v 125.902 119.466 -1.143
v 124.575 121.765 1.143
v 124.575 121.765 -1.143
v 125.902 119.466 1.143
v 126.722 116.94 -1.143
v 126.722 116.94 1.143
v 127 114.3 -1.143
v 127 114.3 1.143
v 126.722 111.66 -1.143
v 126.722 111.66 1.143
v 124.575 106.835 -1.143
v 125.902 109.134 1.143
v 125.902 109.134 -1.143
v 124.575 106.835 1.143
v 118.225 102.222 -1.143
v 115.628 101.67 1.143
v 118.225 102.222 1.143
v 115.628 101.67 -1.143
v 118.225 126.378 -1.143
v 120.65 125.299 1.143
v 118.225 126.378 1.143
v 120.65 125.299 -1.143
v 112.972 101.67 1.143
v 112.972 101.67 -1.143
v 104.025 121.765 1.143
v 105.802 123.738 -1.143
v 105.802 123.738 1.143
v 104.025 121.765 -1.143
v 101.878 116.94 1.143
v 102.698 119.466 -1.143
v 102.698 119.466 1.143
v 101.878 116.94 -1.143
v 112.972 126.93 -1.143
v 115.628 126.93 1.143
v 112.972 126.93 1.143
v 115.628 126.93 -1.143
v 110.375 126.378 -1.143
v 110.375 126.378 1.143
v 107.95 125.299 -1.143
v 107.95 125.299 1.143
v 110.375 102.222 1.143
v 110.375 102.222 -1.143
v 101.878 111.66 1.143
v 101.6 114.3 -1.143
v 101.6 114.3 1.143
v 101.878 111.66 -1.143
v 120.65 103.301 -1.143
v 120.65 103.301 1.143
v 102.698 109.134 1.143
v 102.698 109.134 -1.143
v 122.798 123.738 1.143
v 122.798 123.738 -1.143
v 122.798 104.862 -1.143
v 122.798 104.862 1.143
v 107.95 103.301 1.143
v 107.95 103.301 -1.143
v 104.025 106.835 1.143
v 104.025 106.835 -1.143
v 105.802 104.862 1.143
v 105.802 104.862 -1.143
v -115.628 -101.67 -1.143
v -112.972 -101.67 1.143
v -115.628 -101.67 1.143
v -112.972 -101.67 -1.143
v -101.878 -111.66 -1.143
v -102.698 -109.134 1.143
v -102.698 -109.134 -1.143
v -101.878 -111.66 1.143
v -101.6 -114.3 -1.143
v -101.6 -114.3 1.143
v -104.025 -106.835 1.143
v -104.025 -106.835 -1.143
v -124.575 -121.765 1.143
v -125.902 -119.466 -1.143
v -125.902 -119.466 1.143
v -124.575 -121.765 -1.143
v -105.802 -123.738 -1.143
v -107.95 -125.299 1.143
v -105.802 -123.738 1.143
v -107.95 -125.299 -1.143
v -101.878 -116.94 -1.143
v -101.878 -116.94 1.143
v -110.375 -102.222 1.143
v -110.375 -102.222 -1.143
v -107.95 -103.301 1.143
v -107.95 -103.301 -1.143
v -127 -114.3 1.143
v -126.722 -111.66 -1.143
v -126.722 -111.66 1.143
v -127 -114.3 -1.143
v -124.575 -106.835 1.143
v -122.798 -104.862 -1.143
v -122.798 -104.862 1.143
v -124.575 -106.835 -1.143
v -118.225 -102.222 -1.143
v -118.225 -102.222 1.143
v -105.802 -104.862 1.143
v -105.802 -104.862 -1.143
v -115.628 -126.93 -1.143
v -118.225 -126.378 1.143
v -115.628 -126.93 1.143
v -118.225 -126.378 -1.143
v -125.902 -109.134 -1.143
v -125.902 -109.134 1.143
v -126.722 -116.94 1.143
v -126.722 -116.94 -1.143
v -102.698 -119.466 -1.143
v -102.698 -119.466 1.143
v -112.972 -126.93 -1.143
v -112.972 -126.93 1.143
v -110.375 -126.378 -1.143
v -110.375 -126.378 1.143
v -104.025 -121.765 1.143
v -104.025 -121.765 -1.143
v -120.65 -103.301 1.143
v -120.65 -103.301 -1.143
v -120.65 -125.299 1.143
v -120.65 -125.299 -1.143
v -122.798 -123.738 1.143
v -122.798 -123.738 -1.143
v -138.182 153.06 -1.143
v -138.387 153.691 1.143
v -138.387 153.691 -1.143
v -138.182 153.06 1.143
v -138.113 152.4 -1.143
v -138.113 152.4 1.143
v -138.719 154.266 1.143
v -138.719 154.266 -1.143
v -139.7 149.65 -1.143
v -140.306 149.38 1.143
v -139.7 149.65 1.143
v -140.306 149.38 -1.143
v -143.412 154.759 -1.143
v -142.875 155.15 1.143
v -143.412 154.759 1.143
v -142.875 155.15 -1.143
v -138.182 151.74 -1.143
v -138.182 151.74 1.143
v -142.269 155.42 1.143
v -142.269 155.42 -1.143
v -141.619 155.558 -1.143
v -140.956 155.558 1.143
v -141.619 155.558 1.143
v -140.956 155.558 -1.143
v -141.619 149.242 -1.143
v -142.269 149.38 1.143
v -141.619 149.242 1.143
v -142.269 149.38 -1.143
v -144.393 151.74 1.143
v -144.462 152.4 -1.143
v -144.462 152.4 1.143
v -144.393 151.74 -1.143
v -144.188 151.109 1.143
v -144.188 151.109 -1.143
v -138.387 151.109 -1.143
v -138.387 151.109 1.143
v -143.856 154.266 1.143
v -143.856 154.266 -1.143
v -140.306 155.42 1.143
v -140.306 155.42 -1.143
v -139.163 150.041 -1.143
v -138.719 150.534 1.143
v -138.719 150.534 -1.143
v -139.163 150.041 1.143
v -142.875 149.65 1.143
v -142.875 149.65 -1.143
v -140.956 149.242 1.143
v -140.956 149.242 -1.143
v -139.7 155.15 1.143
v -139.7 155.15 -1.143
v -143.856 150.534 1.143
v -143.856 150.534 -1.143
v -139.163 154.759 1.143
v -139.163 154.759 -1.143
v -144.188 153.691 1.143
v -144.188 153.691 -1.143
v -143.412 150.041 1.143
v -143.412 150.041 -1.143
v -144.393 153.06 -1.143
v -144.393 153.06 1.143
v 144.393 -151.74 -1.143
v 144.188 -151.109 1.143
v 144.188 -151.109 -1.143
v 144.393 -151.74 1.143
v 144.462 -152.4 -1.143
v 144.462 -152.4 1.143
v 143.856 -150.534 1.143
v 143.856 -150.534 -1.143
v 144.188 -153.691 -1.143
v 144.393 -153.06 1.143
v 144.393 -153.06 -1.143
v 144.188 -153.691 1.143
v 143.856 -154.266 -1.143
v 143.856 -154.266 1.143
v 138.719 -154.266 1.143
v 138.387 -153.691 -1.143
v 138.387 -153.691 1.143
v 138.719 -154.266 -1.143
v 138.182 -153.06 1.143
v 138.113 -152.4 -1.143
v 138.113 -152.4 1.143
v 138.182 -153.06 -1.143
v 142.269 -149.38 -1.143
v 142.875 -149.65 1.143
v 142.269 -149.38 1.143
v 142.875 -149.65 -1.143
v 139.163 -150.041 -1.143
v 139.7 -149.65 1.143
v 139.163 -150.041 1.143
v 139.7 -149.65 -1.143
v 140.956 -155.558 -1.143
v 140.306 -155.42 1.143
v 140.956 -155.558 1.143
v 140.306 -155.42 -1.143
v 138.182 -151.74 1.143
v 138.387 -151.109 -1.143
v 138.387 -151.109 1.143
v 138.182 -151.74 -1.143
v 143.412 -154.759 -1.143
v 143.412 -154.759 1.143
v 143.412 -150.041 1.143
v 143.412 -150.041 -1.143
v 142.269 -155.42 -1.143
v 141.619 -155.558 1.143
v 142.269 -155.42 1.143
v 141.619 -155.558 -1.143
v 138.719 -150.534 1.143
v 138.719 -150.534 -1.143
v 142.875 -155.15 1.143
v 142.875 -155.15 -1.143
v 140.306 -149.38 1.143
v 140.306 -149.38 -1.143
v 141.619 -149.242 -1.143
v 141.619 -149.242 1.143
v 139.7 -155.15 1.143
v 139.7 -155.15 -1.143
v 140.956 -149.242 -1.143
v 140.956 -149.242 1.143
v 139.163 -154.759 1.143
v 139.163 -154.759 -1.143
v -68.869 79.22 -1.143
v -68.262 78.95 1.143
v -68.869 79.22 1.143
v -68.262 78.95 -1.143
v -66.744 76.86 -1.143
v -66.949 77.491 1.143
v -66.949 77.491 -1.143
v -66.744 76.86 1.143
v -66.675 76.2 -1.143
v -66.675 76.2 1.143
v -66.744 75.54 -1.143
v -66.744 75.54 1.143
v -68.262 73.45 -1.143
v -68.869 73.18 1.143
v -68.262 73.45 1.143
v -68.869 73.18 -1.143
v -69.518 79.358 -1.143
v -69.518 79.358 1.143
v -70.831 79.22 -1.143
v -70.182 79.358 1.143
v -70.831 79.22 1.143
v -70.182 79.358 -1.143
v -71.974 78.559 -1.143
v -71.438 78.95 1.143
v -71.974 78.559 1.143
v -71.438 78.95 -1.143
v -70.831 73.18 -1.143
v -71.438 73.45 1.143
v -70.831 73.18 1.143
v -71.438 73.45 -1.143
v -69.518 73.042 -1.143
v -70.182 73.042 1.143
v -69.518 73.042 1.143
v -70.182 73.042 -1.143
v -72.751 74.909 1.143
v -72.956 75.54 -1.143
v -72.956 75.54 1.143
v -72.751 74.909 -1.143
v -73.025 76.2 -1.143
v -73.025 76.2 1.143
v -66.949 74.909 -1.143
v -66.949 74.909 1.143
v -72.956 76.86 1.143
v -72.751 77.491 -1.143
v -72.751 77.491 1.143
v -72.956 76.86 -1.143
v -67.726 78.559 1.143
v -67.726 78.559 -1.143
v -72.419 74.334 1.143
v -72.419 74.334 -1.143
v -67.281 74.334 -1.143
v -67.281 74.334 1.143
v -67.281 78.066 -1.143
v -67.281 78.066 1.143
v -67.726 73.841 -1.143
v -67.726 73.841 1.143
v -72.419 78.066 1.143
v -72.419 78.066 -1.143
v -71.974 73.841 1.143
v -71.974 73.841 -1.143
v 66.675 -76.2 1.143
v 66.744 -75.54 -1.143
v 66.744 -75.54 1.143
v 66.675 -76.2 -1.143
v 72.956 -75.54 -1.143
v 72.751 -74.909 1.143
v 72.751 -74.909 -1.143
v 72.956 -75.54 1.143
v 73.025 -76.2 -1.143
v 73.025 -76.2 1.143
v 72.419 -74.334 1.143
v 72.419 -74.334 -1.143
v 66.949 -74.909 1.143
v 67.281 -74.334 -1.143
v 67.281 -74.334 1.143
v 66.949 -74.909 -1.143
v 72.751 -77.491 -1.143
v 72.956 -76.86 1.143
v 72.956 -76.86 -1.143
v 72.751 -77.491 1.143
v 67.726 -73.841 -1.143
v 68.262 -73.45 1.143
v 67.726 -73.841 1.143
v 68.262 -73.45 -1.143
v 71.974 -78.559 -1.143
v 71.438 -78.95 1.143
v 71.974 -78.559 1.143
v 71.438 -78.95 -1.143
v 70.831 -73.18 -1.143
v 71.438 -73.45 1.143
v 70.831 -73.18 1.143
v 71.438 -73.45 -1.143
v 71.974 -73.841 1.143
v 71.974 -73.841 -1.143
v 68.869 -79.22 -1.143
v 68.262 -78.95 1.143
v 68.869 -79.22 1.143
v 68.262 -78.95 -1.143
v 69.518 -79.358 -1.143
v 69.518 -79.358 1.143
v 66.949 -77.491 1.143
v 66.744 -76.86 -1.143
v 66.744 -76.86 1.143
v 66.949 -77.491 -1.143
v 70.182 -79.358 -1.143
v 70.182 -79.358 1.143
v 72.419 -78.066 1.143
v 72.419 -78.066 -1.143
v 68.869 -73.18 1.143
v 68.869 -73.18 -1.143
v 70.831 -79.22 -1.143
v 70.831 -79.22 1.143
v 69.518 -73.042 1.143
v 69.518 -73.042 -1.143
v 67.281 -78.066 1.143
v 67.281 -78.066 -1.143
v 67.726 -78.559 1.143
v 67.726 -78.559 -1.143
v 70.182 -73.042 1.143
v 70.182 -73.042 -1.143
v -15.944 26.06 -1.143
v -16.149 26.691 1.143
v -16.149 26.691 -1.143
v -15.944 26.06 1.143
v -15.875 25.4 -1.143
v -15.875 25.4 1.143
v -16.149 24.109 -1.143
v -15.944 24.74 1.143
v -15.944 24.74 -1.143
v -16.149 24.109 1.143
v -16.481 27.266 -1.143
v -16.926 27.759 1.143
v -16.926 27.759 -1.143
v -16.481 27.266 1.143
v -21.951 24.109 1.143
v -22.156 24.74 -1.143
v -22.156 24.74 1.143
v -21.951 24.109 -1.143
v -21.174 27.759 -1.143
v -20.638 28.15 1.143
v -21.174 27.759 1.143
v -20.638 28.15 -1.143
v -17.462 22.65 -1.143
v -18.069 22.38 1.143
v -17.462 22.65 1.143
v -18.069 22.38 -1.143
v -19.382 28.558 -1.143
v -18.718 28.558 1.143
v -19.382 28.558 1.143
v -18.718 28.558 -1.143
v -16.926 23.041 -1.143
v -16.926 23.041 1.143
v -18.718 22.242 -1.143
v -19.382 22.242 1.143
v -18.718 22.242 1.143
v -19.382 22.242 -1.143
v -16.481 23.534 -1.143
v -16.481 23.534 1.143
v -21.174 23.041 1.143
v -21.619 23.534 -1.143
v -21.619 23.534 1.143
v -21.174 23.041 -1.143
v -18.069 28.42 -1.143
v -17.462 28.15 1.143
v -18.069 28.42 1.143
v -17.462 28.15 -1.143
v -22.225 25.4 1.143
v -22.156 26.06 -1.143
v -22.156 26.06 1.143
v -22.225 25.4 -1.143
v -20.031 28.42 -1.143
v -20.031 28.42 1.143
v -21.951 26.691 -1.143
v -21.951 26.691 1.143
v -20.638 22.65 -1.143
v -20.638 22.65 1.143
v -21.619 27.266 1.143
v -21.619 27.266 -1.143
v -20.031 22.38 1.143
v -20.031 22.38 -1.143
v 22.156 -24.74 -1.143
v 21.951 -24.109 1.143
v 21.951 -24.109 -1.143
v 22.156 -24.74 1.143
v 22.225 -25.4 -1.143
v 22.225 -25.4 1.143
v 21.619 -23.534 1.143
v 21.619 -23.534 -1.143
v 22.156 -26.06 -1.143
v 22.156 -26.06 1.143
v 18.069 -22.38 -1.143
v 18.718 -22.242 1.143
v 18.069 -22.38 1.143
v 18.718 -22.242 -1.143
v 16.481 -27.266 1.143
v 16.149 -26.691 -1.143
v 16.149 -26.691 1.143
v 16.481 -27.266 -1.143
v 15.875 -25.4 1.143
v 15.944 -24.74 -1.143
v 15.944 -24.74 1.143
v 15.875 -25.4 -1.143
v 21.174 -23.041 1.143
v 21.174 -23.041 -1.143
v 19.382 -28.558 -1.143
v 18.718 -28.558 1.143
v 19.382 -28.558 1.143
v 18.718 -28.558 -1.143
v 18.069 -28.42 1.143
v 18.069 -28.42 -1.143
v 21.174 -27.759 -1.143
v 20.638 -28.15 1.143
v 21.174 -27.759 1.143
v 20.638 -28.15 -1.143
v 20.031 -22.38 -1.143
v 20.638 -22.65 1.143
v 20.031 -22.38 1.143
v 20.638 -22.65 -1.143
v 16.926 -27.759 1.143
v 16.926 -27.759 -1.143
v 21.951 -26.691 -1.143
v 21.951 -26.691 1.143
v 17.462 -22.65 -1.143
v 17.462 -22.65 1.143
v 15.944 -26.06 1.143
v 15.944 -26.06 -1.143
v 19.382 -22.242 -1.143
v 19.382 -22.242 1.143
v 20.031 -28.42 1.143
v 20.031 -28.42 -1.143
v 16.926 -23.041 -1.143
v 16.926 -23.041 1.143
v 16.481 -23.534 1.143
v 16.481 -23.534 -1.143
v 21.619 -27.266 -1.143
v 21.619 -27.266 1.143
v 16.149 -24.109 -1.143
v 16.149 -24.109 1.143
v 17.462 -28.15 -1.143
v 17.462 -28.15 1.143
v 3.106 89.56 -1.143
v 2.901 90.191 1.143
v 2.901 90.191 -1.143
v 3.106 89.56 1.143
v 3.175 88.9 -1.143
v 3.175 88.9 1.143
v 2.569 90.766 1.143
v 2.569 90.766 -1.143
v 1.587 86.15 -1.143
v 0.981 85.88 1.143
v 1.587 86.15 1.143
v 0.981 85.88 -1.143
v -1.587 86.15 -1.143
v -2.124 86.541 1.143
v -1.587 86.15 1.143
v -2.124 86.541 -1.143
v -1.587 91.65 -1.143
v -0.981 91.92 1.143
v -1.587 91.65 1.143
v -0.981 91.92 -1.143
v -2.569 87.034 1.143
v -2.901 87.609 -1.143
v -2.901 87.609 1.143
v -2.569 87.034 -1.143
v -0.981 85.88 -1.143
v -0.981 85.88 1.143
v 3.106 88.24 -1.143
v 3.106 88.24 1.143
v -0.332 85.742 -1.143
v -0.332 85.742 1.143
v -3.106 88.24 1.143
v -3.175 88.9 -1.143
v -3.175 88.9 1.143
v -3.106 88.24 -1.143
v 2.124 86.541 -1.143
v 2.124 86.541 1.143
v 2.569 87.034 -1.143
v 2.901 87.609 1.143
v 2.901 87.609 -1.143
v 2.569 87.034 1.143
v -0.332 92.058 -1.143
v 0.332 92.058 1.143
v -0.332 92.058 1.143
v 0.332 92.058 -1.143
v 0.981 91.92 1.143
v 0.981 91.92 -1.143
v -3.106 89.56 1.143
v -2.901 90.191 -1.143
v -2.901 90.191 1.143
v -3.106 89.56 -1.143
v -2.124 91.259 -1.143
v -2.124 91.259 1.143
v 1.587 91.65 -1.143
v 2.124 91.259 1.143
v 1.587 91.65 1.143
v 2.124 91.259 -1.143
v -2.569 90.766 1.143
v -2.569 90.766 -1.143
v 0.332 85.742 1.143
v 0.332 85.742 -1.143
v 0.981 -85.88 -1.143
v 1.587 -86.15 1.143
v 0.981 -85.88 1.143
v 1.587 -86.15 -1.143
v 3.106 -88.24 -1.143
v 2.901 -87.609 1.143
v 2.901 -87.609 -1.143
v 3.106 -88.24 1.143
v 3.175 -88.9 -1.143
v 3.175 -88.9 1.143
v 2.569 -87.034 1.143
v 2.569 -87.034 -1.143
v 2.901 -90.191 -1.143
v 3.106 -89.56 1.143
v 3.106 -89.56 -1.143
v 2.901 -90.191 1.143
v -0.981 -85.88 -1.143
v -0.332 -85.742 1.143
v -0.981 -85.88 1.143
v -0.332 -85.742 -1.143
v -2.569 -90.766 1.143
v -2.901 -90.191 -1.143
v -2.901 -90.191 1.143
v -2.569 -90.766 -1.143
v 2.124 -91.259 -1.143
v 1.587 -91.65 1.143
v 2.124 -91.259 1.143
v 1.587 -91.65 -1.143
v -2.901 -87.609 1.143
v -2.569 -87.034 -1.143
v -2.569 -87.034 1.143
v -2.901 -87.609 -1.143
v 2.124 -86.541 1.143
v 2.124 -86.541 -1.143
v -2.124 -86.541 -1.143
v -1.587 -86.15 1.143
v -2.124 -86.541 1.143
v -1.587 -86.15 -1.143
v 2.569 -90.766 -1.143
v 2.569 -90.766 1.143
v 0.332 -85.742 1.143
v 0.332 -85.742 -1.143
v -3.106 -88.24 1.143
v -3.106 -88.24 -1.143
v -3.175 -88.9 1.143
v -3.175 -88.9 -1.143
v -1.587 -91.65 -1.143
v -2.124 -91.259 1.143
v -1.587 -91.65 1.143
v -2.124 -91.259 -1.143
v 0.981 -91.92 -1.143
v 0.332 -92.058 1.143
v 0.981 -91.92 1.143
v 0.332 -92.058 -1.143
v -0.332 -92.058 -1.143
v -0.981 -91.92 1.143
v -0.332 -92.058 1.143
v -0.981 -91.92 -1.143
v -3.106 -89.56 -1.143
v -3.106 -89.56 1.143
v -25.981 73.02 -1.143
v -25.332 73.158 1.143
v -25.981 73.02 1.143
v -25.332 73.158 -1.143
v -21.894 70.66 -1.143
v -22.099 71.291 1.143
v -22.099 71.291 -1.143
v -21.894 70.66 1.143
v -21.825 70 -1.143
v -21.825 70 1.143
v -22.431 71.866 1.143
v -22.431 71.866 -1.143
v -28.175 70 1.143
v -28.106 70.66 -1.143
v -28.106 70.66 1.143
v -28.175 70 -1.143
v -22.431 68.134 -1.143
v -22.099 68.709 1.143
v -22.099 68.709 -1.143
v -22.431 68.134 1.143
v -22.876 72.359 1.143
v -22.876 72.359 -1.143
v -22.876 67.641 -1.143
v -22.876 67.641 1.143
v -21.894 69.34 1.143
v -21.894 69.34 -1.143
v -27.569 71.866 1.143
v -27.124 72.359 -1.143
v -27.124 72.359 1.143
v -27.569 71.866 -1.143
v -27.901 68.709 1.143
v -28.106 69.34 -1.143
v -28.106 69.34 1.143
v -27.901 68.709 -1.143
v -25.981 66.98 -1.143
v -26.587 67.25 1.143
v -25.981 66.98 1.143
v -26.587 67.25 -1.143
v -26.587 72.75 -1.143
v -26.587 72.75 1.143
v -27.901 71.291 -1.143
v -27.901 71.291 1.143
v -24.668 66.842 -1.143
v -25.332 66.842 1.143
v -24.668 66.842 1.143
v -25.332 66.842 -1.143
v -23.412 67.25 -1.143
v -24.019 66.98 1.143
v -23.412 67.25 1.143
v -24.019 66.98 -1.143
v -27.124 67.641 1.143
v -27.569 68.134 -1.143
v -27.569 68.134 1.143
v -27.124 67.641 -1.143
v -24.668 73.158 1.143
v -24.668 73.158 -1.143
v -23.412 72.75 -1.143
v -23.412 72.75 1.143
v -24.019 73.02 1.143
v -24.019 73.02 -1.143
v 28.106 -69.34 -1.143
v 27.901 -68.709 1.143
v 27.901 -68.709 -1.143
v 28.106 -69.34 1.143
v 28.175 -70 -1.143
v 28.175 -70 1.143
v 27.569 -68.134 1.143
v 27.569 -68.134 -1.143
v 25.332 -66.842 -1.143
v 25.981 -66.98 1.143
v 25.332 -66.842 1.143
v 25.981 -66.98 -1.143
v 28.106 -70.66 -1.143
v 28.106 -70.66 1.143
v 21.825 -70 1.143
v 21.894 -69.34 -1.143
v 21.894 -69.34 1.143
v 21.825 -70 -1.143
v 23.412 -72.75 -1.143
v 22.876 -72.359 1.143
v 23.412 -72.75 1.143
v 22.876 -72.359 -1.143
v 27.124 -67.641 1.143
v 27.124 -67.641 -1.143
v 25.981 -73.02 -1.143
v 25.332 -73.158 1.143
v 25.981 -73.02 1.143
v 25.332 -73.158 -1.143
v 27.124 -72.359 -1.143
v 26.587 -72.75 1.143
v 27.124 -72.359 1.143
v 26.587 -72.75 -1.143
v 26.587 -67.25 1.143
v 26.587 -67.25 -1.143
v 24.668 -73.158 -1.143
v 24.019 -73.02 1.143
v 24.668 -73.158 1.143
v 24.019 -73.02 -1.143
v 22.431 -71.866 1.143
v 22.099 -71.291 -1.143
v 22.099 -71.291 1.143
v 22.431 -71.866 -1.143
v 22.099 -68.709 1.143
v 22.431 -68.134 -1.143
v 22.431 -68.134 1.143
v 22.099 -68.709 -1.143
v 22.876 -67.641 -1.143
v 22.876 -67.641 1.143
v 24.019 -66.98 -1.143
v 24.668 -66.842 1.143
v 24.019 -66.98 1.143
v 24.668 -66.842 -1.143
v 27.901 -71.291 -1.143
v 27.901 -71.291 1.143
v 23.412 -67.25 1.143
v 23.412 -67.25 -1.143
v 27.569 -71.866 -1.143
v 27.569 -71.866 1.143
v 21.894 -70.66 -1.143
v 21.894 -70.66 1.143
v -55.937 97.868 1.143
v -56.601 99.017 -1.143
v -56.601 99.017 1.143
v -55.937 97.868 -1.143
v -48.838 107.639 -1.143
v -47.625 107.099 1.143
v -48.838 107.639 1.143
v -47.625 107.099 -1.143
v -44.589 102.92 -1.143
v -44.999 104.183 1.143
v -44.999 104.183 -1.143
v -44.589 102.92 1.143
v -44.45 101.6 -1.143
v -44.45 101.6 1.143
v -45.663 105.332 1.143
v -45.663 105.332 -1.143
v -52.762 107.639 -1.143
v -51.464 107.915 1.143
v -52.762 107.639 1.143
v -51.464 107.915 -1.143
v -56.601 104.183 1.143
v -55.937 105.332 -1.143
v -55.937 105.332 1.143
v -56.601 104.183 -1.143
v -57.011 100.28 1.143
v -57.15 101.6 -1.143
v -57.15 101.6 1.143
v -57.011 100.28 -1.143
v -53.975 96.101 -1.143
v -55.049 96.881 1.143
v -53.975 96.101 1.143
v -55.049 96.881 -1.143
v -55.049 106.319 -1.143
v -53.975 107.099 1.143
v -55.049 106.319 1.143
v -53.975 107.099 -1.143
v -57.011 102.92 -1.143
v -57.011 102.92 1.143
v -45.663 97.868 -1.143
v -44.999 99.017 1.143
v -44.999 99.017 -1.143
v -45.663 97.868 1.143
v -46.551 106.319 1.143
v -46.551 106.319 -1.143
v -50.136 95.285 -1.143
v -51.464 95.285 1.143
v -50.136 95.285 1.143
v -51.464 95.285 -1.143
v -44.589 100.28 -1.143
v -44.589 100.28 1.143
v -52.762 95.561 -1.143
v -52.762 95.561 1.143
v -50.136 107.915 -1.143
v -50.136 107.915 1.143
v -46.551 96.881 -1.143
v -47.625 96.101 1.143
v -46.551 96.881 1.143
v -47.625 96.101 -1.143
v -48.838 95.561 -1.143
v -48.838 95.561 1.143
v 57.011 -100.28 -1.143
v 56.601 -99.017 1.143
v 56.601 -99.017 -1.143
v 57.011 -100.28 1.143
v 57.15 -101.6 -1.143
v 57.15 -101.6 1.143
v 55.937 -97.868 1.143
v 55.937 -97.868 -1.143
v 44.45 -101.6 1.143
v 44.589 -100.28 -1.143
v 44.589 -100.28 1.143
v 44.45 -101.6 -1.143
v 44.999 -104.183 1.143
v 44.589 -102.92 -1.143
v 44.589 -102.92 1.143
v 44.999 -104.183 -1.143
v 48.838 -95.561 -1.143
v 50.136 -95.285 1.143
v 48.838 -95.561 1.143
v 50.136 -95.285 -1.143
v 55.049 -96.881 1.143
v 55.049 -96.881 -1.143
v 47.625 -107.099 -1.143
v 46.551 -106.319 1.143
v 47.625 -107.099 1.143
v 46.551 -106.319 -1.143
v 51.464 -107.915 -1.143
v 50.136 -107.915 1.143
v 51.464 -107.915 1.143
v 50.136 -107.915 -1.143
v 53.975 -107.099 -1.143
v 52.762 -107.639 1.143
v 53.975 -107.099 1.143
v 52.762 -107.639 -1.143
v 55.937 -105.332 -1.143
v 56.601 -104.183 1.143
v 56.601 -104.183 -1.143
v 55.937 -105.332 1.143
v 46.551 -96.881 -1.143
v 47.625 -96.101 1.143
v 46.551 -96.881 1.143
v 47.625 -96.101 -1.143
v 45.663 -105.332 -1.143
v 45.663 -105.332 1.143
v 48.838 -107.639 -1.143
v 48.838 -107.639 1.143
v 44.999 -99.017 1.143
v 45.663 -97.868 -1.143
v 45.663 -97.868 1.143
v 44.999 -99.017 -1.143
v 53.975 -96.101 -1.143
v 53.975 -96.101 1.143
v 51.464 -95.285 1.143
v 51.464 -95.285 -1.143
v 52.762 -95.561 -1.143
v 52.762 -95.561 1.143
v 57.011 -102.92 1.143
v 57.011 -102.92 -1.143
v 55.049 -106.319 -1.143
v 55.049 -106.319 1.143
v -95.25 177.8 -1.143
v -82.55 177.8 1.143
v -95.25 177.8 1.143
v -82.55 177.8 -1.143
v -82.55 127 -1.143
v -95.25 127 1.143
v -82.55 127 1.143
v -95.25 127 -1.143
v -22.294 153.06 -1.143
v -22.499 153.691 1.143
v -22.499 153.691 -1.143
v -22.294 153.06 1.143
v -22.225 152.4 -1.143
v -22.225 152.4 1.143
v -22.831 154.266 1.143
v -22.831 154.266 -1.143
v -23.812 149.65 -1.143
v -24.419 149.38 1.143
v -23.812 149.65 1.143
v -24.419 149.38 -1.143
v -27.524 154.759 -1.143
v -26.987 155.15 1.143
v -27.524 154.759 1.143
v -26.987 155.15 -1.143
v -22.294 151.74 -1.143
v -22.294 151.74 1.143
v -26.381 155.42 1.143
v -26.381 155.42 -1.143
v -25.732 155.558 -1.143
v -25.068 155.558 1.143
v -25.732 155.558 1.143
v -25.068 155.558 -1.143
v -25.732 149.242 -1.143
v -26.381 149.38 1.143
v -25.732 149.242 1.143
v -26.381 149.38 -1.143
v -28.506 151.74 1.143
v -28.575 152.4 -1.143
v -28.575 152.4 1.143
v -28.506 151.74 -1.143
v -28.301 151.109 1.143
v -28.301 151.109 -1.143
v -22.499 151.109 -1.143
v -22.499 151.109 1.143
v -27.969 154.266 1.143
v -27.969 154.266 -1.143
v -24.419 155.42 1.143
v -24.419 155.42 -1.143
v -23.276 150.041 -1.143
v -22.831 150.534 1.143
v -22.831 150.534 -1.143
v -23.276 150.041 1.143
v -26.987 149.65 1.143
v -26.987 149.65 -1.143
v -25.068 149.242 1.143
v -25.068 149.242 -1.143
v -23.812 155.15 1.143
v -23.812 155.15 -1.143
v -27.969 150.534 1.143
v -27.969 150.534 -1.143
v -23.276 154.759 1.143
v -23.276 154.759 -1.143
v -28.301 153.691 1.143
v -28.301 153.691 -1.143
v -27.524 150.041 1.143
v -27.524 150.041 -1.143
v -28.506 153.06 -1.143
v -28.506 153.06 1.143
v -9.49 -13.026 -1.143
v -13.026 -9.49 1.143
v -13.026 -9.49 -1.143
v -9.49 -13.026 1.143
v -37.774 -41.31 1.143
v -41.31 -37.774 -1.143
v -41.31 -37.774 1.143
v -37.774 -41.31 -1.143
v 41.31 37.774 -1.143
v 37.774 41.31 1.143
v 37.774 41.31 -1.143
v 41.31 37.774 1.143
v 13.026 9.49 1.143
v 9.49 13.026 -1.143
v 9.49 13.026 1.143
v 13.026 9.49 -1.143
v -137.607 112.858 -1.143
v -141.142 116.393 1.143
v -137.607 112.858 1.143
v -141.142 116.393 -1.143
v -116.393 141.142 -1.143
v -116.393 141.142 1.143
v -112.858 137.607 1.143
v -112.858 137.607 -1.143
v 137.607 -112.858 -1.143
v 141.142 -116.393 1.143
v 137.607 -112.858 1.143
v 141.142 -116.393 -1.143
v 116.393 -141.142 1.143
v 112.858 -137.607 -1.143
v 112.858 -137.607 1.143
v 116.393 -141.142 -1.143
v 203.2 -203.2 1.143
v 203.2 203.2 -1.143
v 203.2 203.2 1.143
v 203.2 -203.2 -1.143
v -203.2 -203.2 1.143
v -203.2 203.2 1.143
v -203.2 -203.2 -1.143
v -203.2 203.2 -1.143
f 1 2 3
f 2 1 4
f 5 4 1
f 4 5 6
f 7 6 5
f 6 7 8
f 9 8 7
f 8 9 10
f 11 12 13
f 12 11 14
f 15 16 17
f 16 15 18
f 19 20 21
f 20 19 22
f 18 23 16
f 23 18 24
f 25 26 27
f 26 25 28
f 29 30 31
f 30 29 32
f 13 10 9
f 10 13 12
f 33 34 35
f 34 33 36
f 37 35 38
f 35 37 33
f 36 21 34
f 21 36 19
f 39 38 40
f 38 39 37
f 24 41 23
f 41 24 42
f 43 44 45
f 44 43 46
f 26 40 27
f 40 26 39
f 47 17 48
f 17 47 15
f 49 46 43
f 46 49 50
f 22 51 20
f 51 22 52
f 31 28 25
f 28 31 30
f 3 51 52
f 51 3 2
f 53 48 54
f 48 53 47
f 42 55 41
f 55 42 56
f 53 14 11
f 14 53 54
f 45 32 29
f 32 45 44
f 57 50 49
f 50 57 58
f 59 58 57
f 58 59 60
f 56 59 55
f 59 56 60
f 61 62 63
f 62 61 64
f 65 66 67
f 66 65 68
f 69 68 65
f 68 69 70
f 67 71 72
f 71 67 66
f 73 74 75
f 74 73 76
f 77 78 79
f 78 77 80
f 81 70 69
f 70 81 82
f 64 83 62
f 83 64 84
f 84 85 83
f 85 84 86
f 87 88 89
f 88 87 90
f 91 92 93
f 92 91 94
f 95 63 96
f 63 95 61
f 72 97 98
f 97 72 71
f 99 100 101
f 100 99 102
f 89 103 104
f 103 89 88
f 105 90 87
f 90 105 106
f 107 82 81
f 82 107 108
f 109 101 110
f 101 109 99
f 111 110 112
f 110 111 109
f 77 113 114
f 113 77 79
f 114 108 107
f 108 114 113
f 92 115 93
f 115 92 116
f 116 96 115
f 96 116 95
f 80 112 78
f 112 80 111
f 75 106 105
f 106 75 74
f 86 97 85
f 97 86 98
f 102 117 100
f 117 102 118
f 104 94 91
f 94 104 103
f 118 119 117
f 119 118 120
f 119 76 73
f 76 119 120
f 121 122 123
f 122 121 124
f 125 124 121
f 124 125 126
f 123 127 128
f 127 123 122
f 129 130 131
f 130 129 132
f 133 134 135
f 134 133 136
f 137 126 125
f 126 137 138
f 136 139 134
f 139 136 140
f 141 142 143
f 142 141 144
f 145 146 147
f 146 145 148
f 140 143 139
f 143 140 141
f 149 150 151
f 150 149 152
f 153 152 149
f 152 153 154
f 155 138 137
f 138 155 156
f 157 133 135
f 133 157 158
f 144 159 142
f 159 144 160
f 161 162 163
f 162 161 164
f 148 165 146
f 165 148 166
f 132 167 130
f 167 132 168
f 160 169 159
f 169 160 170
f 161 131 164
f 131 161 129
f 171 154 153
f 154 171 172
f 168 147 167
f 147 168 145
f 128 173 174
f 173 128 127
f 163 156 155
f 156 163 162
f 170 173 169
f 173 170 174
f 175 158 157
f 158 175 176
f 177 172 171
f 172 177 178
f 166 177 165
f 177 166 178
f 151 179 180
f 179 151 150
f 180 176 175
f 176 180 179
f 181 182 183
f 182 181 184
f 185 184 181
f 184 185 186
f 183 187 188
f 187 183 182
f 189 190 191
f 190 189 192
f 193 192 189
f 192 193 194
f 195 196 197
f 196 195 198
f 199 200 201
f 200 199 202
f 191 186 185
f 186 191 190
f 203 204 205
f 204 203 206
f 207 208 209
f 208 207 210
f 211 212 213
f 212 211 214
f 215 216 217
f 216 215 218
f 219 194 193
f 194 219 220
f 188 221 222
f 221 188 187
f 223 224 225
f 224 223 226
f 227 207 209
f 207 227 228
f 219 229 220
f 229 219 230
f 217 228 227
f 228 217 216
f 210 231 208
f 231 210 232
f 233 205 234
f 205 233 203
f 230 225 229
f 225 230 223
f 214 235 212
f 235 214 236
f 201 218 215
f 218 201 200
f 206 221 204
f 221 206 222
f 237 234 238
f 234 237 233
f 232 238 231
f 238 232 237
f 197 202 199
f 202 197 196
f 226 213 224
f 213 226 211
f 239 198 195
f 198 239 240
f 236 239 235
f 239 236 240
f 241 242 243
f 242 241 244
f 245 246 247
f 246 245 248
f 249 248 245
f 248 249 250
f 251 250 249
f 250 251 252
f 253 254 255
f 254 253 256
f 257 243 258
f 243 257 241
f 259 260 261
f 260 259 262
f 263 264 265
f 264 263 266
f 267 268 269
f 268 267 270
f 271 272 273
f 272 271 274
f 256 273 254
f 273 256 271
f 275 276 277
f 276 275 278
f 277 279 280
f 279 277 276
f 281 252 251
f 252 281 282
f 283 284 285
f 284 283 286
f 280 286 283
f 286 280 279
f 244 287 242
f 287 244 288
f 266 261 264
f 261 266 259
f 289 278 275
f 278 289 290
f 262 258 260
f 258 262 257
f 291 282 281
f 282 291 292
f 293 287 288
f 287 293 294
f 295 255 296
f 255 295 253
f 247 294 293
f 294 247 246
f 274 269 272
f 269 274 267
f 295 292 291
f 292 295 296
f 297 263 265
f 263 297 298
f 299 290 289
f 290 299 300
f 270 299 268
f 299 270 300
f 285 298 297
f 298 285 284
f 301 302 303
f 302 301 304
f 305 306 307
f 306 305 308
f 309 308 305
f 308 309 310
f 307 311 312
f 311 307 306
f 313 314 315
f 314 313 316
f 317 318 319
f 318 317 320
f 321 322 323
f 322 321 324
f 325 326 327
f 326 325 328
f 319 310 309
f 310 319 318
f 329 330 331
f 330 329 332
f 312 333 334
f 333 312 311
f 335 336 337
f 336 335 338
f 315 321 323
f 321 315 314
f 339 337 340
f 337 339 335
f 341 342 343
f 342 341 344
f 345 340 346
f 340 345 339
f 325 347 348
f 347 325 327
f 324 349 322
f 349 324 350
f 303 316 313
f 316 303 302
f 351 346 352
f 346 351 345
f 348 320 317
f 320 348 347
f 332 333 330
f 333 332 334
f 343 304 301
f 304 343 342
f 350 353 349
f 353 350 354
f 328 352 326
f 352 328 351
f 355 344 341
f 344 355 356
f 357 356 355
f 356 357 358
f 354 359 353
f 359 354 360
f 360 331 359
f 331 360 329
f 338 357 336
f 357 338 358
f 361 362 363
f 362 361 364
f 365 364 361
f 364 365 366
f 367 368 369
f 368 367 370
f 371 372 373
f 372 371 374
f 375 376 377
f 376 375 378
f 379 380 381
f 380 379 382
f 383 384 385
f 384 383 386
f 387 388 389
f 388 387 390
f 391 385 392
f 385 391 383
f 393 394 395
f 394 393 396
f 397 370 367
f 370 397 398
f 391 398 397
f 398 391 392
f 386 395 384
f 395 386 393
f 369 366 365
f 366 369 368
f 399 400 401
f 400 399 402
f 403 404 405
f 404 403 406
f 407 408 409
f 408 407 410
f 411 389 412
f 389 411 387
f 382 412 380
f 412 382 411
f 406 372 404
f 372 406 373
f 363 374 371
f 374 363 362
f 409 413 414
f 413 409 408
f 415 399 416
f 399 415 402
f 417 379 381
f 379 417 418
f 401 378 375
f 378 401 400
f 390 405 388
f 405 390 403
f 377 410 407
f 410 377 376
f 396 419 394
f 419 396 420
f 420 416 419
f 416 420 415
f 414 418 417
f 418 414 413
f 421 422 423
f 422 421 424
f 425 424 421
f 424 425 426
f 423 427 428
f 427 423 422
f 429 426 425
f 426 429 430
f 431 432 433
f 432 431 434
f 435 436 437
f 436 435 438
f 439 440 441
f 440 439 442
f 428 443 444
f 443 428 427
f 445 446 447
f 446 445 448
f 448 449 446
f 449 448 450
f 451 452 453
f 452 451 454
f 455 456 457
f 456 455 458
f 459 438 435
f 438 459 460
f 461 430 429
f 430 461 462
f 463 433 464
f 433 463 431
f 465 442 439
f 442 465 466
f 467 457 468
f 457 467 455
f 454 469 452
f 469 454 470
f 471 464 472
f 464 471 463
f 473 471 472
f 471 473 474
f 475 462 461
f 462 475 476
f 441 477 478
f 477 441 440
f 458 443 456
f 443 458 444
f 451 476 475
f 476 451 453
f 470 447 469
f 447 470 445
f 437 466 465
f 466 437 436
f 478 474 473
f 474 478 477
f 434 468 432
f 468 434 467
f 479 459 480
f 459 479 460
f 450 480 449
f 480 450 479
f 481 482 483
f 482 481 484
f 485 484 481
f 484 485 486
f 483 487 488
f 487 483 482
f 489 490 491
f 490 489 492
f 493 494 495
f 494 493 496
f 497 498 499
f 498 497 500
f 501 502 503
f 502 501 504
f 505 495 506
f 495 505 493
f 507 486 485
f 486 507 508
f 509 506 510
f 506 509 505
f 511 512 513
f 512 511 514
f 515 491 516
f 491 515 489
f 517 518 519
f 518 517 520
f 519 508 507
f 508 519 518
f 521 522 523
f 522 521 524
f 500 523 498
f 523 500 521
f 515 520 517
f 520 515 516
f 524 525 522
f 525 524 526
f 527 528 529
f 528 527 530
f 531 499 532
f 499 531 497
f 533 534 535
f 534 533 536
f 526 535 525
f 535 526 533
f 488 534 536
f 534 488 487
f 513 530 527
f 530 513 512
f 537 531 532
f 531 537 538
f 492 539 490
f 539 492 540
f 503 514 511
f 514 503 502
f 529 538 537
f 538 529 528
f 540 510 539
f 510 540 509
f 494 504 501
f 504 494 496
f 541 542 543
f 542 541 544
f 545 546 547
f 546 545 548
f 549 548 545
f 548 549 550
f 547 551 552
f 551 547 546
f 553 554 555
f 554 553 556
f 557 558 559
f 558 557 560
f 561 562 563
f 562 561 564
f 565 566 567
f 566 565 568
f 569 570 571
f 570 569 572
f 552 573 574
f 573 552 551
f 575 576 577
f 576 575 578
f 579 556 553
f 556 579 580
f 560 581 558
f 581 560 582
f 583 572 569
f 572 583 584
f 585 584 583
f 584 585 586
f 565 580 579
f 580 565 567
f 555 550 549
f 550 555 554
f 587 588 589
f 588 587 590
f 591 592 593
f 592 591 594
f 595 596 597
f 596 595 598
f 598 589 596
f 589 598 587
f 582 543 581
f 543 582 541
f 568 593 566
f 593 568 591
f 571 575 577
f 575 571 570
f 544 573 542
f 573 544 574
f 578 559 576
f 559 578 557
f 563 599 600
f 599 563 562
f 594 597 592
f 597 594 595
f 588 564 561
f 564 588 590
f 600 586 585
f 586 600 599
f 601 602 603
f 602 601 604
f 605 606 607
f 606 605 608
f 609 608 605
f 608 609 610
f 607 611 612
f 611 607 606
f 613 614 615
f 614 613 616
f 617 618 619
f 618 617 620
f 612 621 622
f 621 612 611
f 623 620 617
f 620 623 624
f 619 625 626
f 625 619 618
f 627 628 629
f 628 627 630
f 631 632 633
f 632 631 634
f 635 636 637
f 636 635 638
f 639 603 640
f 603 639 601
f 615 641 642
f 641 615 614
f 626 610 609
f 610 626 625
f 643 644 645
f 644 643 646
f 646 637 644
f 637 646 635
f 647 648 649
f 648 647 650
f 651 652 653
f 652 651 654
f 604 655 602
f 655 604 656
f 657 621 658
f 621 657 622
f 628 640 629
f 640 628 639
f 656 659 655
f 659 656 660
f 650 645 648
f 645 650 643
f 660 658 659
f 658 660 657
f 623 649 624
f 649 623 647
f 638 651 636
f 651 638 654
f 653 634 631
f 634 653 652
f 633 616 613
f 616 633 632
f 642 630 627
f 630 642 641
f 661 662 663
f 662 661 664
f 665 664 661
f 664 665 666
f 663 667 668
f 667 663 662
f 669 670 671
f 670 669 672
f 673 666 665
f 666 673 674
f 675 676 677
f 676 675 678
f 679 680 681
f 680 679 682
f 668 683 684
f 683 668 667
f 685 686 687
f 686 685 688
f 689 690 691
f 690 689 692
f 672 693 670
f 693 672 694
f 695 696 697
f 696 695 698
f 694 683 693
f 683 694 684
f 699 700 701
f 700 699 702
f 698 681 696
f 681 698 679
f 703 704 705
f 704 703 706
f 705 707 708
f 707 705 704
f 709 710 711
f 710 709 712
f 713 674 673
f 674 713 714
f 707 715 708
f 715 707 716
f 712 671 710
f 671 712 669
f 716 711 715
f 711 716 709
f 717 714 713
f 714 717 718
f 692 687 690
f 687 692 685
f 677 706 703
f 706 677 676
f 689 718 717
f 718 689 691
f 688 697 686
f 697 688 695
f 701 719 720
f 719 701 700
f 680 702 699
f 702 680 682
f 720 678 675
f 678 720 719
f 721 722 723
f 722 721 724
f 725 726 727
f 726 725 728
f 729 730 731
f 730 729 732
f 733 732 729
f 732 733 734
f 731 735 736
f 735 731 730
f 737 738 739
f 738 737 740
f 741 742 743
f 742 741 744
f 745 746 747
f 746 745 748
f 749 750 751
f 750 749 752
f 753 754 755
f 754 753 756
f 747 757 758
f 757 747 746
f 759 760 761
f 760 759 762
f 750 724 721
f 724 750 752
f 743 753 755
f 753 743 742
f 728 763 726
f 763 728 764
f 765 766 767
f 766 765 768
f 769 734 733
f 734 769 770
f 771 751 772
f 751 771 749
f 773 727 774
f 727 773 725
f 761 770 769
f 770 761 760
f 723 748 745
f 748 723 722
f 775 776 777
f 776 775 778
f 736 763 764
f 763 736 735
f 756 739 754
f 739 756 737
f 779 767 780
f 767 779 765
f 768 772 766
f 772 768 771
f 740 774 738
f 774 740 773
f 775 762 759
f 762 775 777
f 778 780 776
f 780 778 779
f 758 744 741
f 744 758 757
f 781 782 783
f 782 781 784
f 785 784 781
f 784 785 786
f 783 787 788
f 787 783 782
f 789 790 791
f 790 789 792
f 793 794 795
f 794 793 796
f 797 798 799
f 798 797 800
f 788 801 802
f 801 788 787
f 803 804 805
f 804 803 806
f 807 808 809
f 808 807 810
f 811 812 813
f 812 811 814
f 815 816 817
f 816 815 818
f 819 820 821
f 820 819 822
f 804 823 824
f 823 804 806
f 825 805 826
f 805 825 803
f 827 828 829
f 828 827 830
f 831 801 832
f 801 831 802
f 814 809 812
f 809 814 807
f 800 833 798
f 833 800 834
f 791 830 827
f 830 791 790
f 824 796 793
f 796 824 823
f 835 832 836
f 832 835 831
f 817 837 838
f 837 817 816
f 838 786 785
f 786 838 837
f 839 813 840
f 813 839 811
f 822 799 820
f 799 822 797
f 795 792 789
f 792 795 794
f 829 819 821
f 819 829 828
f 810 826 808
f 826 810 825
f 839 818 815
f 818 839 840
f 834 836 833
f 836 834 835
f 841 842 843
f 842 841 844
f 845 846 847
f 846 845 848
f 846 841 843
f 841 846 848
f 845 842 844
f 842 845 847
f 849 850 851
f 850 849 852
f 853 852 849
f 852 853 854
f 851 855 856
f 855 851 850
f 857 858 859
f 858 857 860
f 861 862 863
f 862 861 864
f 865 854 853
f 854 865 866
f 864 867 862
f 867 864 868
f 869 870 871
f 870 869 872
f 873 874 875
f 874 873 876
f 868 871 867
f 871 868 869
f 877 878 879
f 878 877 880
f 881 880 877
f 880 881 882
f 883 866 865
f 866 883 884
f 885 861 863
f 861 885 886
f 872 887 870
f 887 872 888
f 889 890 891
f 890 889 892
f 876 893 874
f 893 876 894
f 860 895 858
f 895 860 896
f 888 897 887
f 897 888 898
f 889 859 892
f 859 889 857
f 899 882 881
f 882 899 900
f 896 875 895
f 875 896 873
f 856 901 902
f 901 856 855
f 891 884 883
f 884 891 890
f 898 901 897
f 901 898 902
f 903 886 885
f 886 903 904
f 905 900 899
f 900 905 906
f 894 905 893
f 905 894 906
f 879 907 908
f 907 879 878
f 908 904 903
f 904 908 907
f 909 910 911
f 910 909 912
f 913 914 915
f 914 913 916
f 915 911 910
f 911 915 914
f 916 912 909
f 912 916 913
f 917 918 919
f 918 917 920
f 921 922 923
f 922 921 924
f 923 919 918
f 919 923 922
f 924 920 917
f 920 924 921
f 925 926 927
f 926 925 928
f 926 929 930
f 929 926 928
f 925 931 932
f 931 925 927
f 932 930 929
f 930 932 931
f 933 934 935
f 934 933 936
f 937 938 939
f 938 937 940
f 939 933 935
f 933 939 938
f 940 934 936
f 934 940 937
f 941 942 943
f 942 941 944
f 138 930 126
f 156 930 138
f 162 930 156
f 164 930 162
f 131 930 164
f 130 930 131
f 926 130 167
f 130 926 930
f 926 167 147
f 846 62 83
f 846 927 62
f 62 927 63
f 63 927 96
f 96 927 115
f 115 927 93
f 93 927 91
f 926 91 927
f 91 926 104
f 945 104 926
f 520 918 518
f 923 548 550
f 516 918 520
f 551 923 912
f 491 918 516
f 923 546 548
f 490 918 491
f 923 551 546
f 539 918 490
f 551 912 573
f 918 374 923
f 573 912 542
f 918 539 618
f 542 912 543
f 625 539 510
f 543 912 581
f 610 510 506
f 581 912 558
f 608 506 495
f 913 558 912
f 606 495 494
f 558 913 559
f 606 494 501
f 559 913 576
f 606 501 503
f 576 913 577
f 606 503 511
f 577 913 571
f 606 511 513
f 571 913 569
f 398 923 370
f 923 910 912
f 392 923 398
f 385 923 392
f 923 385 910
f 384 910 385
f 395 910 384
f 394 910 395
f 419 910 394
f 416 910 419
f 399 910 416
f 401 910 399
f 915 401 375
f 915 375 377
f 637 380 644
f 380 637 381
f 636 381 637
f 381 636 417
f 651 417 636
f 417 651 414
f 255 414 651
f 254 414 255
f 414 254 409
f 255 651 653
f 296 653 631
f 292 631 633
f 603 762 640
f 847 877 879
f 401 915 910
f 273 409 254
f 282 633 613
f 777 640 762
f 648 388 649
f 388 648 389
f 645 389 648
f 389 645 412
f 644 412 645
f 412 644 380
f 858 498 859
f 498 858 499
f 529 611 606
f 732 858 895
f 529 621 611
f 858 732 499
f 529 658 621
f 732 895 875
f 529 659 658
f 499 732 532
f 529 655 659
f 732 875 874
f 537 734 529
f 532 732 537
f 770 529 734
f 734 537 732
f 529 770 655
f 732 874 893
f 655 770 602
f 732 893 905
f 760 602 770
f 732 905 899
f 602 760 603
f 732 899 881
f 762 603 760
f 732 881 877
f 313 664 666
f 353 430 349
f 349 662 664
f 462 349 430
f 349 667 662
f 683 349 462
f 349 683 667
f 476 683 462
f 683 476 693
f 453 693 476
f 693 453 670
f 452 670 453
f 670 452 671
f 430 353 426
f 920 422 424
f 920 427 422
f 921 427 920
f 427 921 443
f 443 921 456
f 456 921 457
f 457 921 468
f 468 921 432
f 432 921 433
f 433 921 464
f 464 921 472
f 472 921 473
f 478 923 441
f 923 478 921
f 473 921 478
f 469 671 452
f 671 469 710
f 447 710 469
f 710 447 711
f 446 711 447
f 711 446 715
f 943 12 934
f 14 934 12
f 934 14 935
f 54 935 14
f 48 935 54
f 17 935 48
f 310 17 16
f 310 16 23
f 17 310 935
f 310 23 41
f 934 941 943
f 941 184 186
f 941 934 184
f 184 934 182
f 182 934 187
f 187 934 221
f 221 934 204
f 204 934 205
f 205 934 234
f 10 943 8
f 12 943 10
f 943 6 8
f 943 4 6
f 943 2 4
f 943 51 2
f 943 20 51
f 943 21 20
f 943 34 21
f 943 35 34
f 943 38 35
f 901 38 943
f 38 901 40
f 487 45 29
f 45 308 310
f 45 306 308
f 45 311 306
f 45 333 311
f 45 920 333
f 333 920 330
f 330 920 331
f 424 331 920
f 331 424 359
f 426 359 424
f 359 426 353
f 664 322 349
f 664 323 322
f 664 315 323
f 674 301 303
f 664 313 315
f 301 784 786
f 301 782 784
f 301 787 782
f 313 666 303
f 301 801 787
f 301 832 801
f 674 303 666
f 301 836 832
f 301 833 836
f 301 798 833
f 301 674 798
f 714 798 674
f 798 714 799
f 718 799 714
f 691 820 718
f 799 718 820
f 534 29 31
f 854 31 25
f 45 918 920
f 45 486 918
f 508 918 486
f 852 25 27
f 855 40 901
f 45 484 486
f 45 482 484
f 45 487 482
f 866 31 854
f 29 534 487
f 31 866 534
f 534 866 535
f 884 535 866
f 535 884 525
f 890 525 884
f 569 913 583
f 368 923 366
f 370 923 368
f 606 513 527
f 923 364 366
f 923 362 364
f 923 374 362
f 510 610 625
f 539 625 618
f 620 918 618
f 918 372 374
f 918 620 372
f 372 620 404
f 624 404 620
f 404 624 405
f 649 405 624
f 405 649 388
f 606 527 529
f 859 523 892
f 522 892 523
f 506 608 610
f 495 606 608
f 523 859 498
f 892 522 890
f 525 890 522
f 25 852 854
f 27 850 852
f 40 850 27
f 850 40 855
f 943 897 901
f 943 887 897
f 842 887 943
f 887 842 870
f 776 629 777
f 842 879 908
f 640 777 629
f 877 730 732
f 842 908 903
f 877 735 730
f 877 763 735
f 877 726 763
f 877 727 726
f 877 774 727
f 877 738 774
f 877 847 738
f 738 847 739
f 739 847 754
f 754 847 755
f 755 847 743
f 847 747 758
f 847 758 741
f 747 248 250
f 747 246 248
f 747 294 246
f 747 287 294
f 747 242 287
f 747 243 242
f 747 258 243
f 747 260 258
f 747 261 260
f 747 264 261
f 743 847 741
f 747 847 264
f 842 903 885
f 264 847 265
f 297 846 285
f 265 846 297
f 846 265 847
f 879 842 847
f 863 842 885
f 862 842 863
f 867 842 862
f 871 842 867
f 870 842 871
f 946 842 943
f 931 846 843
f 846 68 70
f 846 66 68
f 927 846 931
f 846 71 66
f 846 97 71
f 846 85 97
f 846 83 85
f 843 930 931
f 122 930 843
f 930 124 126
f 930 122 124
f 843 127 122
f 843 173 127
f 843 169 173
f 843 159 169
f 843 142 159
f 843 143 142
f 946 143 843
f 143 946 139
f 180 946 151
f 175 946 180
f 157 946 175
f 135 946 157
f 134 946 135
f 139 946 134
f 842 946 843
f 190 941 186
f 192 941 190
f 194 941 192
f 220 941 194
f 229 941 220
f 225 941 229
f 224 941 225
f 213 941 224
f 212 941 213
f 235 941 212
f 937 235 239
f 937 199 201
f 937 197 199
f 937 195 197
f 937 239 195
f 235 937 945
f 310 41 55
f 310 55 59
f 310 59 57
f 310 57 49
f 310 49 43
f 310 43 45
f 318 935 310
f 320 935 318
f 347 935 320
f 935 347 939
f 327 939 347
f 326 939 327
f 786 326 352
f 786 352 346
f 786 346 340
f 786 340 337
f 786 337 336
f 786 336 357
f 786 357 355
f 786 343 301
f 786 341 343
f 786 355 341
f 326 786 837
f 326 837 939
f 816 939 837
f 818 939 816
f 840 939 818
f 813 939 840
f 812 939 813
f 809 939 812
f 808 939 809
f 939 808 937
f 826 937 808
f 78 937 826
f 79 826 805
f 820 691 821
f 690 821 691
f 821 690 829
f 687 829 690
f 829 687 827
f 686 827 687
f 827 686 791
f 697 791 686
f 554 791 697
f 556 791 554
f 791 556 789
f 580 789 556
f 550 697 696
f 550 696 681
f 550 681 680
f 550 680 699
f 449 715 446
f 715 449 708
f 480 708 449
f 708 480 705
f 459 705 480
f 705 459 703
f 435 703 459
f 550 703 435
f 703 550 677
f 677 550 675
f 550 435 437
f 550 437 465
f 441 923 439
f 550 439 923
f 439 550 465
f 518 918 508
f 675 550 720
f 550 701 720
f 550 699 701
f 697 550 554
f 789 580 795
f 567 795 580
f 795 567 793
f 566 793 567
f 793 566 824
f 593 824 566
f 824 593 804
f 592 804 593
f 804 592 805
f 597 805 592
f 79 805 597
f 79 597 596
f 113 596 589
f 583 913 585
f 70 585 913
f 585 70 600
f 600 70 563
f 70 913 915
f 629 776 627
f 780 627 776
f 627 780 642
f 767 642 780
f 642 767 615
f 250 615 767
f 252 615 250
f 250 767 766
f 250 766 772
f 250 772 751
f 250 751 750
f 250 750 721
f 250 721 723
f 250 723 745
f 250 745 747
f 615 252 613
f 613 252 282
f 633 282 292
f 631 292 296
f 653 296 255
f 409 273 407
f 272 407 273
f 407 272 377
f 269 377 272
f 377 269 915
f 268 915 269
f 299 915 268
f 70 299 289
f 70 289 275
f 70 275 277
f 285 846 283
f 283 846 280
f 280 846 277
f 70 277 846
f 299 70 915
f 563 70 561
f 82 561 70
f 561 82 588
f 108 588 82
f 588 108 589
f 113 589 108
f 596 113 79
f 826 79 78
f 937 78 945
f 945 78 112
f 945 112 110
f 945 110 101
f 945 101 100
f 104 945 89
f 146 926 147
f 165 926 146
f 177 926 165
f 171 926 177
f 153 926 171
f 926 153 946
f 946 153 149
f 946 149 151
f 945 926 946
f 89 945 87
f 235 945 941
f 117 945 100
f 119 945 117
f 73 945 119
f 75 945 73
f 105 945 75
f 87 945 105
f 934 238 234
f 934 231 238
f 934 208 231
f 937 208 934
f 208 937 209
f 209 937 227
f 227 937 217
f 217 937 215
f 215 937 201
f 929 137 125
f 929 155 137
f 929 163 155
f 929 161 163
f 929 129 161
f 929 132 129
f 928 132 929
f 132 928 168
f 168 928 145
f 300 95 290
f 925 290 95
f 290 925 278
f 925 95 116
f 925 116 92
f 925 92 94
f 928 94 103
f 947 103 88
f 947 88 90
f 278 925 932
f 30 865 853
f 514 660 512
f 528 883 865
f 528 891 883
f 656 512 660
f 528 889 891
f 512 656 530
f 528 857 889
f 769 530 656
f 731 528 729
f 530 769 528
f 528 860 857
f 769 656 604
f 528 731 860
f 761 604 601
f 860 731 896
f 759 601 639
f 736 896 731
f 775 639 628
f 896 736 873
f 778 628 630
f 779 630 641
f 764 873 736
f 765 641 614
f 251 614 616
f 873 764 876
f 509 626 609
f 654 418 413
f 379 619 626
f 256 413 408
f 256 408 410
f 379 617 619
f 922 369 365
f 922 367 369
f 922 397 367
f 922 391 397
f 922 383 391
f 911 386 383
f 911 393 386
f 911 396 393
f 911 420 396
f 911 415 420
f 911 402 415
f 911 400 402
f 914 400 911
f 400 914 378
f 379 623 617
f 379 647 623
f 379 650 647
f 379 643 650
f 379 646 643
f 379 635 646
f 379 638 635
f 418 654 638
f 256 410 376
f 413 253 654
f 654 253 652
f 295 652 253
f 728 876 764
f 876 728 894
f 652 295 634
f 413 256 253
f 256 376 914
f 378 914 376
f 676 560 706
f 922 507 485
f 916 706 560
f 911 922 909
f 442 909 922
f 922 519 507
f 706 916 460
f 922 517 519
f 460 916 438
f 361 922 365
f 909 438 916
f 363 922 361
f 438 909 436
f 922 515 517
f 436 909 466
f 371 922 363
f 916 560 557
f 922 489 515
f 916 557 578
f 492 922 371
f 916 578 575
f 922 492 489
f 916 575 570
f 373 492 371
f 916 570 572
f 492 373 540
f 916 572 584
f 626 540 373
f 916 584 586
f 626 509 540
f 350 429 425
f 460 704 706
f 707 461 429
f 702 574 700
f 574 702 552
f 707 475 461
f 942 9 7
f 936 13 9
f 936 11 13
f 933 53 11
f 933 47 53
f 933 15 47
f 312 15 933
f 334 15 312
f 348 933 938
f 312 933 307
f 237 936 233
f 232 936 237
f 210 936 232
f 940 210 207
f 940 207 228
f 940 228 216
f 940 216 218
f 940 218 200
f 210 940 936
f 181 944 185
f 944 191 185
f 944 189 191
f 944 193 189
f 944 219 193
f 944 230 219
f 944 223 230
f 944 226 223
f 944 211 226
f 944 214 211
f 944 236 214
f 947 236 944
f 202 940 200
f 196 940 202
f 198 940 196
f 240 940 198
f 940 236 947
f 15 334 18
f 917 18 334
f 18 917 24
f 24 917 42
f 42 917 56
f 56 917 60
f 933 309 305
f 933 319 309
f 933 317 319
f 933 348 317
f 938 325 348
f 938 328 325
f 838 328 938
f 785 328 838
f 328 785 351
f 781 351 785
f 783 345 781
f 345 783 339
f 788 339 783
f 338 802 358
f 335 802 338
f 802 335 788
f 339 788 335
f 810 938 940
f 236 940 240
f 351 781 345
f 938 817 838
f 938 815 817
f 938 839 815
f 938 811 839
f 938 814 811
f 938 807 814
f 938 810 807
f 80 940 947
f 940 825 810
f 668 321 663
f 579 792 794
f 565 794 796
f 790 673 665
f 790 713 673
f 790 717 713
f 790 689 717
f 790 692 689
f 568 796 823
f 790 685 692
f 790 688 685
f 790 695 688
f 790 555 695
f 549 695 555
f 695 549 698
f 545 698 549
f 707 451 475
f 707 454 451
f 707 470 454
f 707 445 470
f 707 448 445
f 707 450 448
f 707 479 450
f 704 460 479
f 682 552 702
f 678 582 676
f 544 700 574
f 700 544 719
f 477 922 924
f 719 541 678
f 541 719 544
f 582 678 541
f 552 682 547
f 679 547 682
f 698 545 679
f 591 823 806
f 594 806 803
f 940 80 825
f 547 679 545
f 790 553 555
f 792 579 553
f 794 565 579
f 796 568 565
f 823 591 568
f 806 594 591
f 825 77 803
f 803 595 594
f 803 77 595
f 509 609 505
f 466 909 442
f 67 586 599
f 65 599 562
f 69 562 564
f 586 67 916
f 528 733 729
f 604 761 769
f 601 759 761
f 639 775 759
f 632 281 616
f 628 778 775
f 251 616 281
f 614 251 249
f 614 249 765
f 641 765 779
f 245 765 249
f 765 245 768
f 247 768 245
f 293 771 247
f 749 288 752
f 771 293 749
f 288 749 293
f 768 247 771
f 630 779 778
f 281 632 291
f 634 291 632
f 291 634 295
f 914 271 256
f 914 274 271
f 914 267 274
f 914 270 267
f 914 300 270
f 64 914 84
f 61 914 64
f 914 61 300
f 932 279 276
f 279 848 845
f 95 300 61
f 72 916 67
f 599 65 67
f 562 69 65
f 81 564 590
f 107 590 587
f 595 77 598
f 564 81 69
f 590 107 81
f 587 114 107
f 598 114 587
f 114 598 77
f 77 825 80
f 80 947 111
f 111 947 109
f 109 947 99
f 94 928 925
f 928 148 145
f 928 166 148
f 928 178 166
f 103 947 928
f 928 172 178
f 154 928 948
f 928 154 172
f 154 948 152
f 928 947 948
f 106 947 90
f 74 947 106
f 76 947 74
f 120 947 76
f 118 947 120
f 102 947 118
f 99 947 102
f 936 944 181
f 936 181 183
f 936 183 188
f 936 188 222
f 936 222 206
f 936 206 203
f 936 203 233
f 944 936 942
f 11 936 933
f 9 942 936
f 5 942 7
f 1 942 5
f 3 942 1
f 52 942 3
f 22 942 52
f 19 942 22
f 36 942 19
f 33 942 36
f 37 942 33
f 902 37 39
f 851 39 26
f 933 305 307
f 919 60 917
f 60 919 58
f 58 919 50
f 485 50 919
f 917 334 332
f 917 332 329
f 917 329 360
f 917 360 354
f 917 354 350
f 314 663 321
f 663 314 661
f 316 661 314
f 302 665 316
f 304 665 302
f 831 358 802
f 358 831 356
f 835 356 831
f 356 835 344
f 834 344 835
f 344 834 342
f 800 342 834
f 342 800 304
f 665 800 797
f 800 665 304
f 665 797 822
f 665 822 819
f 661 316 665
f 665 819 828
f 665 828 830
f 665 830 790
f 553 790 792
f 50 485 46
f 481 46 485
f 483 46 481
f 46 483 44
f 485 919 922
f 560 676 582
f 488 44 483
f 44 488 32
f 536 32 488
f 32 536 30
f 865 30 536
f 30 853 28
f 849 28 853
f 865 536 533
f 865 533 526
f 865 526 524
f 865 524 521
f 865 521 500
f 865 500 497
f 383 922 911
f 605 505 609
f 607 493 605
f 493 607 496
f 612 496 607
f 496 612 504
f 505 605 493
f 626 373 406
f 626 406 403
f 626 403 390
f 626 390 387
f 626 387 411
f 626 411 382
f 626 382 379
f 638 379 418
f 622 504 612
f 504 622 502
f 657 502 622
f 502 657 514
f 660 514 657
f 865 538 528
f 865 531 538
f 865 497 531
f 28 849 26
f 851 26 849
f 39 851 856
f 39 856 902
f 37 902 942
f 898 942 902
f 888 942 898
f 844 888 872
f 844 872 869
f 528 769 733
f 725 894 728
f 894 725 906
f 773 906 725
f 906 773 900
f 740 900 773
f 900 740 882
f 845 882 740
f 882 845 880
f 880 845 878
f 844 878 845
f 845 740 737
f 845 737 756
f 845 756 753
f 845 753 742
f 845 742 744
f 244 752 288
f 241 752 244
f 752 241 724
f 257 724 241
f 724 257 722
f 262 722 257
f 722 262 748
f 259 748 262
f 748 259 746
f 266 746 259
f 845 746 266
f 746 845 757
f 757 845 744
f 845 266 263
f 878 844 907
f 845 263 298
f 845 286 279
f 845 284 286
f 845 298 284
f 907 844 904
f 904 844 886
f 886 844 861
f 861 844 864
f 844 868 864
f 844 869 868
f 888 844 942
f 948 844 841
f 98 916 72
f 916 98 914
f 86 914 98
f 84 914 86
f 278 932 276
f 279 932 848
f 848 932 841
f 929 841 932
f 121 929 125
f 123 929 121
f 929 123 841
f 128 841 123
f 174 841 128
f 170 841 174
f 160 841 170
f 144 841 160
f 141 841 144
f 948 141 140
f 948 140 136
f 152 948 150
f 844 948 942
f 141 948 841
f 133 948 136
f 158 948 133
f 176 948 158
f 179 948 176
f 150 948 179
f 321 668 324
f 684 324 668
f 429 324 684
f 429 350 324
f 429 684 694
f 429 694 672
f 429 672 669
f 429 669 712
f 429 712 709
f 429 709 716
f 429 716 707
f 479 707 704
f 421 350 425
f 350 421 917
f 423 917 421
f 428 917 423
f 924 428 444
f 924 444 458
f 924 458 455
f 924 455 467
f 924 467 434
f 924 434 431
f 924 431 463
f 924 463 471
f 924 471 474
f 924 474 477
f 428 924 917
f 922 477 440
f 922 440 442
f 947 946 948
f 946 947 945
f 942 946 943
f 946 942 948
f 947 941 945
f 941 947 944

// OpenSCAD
// tape cleaner enclosure top
// Erik Piil
//piil.erik@gmail.com
//https://github.com/epiil/tape-cleaner
//v20150310

//OUTER DIMENSIONS in mm

outerWidth=406.4;
outerLength=406.4;
outerHeight=2.286;


module top()
{
	difference() 
	{
		union() 
		{
			color("dark grey")
			cube(size=[outerWidth, outerLength, outerHeight], center = true, $fs=.01);
		}
		union() 
		{
			translate([114.3,114.3,0])
			cylinder(h=5, d=25.4, center = true, $fs=.01); //supply motor spindle cutout
             translate([-114.3,-114.3,0])
			cylinder(h=5, d=25.4, center = true, $fs=.01); //takeup motor supply cutout
             translate([-141.2875,152.4,0]) 
			cylinder(h=5, d=6.35, center = true, $fs=.01); //supply corner roller
             translate([141.2875,-152.4,0])
			cylinder(h=5, d=6.35, center = true, $fs=.01); // takeup corner roller
             translate([-69.85, 76.2,0])  
			cylinder(h=5, d=6.35, center = true, $fs=.01); //cleaning path guide roller A
             translate([69.85,-76.2,0])
			cylinder(h=5, d=6.35, center = true, $fs=.01); //cleaning path guide roller B
             translate([-19.05, 25.4,0])
			cylinder(h=5, d=6.35, center = true, $fs=.01); //cleaning path guide roller C
             translate([19.05, -25.4,0]) 
			cylinder(h=5, d=6.35, center = true, $fs=.01); //cleaning path guide roller D
             translate([0,88.9,0]) 
			cylinder(h=5, d=6.35, center = true, $fs=.01); //cleaning path guide roller E
             translate([0, -88.9,0])
			cylinder(h=5, d=6.35, center = true, $fs=.01); //cleaning path guide roller F
             translate([-25,70,0])  
			cylinder(h=5, d=6.35, center = true, $fs=.01); //cleaning path guide roller G
             translate([25,-70,0])
			cylinder(h=5, d=6.35, center = true, $fs=.01); //cleaning path guide roller H
             translate([-50.8,101.6,0]) 
			cylinder(h=5, d=12.7, center = true, $fs=.01); //cleaning path guide roller I
             translate([50.8,-101.6,0])
			cylinder(h=5, d=12.7, center = true, $fs=.01); //cleaning path guide roller J
            translate([-88.9, 152.4,0]) 
			rotate(90) cube(size=[50.8, 12.7, 5], center = true, $fs=.01); //tension arm roller cutout
           translate([-25.4, 152.4,0]) 
			cylinder(h=5, d=6.35, center = true, $fs=.01); //supplyside initial roller
	        translate([-25.4,-25.4,0])
			rotate(45) cube(size=[40, 5, 5], center = true, $fs=.01); //IR sensor takeup side
	        translate([25.4, 25.4,0])
			rotate(45) cube(size=[40, 5, 5], center = true, $fs=.01); //IR sensor supply side
	        translate([-127, 127,0])
			rotate(45) cube(size=[35, 5, 5], center = true, $fs=.01); //photoop sensor takeup side
	        translate([127, -127,0])
			rotate(45) cube(size=[35, 5, 5], center = true, $fs=.01); //photoop sensor supply side
		}
	}
}

top();
